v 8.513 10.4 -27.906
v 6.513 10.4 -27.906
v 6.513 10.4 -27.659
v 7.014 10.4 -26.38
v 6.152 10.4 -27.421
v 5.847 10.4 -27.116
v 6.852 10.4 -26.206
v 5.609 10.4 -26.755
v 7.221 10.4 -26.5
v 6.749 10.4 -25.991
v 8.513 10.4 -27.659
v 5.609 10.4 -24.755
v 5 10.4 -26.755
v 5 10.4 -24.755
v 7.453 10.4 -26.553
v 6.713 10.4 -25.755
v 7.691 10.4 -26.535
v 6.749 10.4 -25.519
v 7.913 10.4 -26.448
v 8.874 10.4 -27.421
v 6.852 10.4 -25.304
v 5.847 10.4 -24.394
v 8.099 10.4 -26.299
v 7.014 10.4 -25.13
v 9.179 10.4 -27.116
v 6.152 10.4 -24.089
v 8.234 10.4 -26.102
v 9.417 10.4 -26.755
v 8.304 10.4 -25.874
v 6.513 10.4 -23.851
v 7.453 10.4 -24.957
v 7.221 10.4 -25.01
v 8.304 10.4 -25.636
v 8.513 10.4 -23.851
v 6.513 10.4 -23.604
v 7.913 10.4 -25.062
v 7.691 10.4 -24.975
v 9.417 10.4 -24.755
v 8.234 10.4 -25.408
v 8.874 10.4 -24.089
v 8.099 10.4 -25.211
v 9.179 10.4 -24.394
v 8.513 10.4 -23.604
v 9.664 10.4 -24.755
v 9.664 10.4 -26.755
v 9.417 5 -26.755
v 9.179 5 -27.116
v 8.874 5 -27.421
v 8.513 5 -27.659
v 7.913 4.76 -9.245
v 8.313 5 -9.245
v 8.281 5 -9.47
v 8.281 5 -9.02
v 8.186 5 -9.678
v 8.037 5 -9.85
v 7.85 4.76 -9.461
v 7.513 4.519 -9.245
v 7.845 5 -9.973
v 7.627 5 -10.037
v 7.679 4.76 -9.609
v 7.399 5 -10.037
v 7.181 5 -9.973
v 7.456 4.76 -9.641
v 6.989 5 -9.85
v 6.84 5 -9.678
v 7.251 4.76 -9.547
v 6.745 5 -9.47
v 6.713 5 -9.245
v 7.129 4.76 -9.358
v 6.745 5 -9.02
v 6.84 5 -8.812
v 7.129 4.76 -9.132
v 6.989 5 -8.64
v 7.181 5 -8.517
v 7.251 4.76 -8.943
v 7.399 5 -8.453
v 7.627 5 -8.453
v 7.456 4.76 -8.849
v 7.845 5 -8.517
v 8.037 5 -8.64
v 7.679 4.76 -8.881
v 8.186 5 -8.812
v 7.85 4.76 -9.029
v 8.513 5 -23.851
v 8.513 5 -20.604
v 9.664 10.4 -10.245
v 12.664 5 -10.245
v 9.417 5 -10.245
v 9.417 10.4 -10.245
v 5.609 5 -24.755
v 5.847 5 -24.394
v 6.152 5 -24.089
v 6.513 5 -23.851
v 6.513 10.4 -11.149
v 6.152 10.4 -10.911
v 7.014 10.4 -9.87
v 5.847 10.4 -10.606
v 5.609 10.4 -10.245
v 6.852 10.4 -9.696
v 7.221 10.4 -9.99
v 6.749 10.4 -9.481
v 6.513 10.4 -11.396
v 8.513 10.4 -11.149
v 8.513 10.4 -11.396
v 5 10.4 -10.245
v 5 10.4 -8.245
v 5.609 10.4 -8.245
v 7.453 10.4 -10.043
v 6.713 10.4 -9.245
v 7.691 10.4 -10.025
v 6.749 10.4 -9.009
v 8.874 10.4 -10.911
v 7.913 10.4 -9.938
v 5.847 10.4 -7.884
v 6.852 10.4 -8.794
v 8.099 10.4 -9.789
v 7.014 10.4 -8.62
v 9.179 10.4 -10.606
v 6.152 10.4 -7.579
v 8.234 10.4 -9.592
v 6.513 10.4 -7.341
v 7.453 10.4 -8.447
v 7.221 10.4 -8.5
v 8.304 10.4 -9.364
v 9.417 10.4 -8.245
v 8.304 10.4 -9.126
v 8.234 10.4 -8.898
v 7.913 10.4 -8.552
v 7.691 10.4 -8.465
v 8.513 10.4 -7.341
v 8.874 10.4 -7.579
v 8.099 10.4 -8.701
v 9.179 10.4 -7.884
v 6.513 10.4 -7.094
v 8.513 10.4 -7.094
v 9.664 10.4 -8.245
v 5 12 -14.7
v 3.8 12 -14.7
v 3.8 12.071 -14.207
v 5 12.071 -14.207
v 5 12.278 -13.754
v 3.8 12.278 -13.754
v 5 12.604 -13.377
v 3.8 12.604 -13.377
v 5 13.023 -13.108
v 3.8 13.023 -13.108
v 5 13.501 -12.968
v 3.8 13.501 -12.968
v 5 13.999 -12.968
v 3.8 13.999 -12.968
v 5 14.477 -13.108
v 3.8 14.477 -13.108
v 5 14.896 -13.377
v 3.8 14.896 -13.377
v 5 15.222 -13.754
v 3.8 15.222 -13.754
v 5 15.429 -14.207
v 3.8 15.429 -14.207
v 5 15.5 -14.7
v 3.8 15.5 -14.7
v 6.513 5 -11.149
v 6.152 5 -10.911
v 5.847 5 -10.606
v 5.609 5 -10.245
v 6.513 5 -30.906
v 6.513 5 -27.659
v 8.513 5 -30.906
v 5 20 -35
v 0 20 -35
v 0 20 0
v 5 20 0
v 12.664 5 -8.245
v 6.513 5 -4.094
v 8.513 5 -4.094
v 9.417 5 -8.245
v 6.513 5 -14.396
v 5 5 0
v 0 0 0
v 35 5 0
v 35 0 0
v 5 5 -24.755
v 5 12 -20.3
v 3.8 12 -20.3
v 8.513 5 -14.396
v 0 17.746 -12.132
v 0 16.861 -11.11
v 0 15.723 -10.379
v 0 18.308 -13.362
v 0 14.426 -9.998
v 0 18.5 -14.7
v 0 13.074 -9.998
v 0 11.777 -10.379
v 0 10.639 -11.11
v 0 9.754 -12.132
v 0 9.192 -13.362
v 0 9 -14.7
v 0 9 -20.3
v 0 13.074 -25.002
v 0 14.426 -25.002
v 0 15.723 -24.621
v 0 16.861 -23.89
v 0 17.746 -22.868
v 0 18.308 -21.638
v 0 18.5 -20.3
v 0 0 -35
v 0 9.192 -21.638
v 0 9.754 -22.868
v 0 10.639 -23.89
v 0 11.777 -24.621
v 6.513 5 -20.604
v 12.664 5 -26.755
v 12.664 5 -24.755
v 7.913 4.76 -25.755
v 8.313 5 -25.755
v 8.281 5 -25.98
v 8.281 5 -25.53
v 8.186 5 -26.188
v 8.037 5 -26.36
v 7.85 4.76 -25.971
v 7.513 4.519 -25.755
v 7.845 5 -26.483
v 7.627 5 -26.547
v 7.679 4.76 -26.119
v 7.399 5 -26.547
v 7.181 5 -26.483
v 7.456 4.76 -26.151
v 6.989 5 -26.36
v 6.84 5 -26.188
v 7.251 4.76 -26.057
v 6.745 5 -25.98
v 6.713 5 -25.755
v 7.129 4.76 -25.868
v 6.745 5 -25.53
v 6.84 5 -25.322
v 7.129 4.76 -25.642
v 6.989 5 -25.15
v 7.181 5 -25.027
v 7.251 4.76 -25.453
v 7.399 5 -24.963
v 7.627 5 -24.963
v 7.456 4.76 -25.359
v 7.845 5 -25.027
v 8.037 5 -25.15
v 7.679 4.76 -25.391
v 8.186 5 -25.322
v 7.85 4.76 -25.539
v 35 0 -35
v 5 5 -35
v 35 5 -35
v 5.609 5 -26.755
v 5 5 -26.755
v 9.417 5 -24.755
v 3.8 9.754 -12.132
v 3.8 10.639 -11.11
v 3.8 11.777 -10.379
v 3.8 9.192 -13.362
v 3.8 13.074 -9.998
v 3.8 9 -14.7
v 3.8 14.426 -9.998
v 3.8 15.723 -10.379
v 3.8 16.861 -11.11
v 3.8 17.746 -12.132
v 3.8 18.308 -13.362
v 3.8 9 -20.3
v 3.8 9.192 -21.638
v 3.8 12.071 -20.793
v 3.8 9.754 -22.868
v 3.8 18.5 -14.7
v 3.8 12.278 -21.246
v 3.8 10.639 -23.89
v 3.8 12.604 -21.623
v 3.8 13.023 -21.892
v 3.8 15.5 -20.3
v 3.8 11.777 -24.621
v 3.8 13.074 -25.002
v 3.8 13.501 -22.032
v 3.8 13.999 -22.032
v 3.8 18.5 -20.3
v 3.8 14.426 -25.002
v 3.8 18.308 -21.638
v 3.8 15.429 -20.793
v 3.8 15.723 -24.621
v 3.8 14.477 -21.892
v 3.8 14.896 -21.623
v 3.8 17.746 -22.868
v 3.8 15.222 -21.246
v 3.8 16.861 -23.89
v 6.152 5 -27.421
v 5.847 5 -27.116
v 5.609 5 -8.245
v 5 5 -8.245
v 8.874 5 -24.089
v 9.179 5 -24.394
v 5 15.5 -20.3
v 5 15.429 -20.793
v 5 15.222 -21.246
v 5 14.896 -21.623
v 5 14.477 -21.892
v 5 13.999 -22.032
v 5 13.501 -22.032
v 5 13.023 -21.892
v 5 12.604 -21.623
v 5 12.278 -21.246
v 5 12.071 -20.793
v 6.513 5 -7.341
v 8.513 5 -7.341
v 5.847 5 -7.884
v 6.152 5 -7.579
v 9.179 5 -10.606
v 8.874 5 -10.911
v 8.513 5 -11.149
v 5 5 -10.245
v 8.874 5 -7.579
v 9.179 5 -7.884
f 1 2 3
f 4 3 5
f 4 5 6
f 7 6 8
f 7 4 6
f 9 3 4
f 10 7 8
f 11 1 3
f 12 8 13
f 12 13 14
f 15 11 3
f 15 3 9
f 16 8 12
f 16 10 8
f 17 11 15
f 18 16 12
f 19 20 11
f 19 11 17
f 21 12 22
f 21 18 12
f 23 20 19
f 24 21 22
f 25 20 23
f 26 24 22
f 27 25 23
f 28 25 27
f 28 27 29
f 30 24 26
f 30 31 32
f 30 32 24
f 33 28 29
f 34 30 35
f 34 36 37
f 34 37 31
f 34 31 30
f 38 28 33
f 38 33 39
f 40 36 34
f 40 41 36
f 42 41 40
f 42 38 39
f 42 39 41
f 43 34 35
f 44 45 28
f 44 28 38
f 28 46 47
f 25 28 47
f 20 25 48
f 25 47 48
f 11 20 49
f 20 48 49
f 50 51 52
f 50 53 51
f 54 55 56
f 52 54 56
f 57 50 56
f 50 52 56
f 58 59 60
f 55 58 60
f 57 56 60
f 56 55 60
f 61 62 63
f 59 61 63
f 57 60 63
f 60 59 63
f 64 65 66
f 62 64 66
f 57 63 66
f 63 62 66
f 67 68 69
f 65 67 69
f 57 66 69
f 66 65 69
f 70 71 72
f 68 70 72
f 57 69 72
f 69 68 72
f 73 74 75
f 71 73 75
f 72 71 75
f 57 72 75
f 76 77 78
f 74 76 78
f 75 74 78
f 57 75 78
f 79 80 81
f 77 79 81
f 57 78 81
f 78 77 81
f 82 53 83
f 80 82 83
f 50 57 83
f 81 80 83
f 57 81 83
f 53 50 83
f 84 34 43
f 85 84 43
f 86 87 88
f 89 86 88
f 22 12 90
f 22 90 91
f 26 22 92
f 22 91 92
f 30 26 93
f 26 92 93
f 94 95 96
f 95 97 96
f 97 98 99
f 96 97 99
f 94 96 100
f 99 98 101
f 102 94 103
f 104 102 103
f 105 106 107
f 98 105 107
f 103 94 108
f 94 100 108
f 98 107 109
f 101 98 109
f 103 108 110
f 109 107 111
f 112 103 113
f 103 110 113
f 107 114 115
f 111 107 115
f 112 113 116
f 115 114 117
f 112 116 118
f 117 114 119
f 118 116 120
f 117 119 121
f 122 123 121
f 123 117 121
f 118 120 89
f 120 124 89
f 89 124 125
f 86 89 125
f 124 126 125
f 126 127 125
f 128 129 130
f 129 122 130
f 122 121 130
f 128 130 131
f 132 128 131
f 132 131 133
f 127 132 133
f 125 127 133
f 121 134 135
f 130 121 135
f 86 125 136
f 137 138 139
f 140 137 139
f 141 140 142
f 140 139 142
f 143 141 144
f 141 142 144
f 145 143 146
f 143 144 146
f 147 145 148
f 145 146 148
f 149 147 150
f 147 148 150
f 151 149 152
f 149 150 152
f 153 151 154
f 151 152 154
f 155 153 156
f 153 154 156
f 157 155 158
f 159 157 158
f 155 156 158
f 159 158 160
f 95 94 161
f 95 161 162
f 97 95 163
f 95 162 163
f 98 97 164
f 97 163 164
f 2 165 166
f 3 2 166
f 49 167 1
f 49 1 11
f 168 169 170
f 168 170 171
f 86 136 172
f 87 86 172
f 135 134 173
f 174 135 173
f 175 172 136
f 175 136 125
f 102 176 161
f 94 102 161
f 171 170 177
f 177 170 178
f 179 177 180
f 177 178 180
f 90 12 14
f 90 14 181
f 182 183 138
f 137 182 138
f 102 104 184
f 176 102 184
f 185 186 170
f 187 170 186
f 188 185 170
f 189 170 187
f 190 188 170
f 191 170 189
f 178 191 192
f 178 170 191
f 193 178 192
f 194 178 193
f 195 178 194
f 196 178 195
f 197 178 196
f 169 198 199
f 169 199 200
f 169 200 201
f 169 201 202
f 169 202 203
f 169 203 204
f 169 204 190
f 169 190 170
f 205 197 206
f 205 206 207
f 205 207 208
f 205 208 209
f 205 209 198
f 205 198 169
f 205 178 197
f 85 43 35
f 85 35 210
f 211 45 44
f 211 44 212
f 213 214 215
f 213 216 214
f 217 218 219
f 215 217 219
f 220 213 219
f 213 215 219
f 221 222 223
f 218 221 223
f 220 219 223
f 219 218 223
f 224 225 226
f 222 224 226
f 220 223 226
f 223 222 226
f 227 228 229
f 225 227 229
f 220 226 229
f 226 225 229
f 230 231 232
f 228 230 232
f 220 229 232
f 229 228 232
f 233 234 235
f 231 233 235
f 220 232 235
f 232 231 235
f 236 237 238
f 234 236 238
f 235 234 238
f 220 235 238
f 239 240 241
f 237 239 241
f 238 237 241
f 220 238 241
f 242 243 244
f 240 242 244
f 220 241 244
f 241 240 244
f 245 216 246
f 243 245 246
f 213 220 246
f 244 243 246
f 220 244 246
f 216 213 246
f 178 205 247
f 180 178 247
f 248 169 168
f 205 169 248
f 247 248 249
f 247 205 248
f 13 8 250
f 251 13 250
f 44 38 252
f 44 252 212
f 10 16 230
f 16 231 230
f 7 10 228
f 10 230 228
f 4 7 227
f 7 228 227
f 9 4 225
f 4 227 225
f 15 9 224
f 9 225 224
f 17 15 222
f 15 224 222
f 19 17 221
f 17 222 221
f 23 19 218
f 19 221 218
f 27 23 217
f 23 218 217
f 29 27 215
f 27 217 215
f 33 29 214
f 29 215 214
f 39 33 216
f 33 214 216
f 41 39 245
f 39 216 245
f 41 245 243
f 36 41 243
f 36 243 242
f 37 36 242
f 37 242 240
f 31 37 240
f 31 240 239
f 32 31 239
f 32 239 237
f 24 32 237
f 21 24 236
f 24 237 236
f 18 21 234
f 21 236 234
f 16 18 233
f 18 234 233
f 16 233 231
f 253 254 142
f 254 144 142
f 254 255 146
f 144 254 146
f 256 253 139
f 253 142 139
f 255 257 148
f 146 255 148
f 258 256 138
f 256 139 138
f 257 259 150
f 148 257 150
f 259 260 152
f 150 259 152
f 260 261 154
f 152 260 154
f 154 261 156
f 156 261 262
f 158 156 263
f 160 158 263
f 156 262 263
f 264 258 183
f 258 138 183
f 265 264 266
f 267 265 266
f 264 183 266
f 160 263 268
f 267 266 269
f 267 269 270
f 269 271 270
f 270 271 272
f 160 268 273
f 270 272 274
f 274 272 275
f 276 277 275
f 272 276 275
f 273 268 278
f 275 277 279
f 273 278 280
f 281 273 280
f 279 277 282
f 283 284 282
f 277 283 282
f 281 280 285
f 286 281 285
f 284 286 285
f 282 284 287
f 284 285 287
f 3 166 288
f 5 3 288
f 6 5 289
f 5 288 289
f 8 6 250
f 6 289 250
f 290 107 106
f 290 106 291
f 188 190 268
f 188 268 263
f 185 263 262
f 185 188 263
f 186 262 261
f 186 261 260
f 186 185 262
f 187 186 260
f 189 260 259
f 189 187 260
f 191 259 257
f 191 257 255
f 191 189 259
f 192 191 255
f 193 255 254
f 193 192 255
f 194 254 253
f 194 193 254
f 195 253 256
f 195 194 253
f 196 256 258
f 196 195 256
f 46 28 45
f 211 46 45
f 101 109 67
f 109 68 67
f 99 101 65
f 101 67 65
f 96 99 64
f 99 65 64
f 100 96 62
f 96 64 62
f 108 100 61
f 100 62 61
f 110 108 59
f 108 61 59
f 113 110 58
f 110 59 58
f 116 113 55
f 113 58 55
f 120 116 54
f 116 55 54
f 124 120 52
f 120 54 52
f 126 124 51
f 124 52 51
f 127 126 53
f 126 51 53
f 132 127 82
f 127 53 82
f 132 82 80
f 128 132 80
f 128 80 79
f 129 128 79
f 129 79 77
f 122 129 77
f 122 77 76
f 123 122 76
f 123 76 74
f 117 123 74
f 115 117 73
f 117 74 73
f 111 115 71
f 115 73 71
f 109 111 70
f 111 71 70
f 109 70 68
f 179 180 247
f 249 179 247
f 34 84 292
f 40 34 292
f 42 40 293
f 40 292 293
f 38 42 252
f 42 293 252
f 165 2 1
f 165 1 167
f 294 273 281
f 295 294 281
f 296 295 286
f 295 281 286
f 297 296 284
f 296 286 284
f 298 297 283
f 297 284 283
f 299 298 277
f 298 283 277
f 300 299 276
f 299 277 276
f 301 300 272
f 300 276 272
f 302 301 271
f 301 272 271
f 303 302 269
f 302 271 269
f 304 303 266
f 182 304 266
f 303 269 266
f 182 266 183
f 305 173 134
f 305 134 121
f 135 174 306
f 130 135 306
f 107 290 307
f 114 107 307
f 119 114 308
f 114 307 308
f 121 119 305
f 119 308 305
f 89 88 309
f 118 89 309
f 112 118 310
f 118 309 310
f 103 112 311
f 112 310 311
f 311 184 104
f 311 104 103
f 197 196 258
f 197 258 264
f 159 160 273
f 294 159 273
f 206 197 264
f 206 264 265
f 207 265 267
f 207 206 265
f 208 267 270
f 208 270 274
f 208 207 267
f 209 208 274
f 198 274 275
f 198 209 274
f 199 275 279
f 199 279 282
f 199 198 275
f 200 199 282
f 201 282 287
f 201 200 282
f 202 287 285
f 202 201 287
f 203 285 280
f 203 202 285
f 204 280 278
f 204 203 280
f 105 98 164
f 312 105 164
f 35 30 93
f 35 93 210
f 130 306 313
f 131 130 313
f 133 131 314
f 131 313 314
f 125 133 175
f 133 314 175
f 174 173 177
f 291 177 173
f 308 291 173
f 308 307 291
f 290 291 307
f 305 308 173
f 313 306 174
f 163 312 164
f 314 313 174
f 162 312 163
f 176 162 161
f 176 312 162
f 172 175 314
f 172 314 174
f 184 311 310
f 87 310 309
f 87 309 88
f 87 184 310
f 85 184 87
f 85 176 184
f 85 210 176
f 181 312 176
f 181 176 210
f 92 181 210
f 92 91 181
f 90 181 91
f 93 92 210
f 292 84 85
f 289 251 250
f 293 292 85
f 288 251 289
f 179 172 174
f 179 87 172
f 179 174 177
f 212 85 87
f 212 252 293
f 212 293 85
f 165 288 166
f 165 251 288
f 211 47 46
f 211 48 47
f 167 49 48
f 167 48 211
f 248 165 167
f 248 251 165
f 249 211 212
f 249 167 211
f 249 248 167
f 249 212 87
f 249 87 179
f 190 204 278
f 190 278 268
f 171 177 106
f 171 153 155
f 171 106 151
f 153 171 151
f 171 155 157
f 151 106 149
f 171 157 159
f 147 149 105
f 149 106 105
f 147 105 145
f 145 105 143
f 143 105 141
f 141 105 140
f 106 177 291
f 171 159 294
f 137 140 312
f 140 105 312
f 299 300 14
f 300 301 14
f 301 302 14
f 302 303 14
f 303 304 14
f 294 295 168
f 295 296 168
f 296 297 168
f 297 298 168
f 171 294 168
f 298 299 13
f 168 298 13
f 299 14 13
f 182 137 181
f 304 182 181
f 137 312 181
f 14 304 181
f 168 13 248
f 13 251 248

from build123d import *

# Parameters (mm, degrees)
SKETCH1_W             = 30
SKETCH1_H             = 35
BOSS_EXTRUDE1_DEPTH   = 5
SKETCH1_3_W           = 5
SKETCH1_3_H           = 35
BOSS_EXTRUDE2_DEPTH   = 20
CUT_EXTRUDE1_DEPTH    = 5
CUT_EXTRUDE2_DEPTH    = 3.8
SKETCH3_R             = 2.151
BOSS_EXTRUDE3_DEPTH   = 5.4
RIB1_START            = -1
RIB1_DEPTH            = 2
CIRPATTERN6_COUNT     = 4
SKETCH6_W             = 5.4
SKETCH6_H             = 0.862
BOSS_EXTRUDE4_DEPTH   = 1
MIRROR1_START         = -1
MIRROR1_COPY_1_DEPTH  = 2
MIRROR1_COPY_2_DEPTH  = 2
M2_TAPPED_HOLE1_D     = 1.6
M2_TAPPED_HOLE1_DEPTH = 5.4
M2_TAPPED_HOLE1_TIP   = 0.480688495


with BuildPart() as part:
    # Sketch1 → Boss-Extrude1 (new body)
    with BuildSketch(Plane(origin=(0, 0, 0), x_dir=(1, 0, 0), z_dir=(0, 1, 0))):
        with Locations((20, 17.5)):
            Rectangle(SKETCH1_W, SKETCH1_H)
    extrude(amount=BOSS_EXTRUDE1_DEPTH)

    # Sketch1<3> → Boss-Extrude2 (add)
    with BuildSketch(Plane(origin=(0, 0, 0), x_dir=(1, 0, 0), z_dir=(0, 1, 0))):
        with Locations((2.5, 17.5)):
            Rectangle(SKETCH1_3_W, SKETCH1_3_H)
    extrude(amount=BOSS_EXTRUDE2_DEPTH)

    # Sketch2 → Cut-Extrude1 (cut)
    with BuildSketch(Plane.ZY):
        with BuildLine():
            Line((-20.3, 12), (-14.7, 12))
            ThreePointArc((-14.7, 12), (-12.95, 13.75), (-14.7, 15.5))
            Line((-14.7, 15.5), (-20.3, 15.5))
            ThreePointArc((-20.3, 15.5), (-22.05, 13.75), (-20.3, 12))
        make_face()
    extrude(amount=-CUT_EXTRUDE1_DEPTH, mode=Mode.SUBTRACT)

    # Sketch2<4> → Cut-Extrude2 (cut)
    with BuildSketch(Plane.ZY):
        with BuildLine():
            Line((-20.3, 18.5), (-14.7, 18.5))
            ThreePointArc((-14.7, 18.5), (-9.95, 13.75), (-14.7, 9))
            Line((-14.7, 9), (-20.3, 9))
            ThreePointArc((-20.3, 9), (-25.05, 13.75), (-20.3, 18.5))
        make_face()
        with BuildLine():
            ThreePointArc((-14.7, 12), (-12.95, 13.75), (-14.7, 15.5))
            Line((-14.7, 15.5), (-20.3, 15.5))
            ThreePointArc((-20.3, 15.5), (-22.05, 13.75), (-20.3, 12))
            Line((-20.3, 12), (-14.7, 12))
        make_face(mode=Mode.SUBTRACT)
    extrude(amount=-CUT_EXTRUDE2_DEPTH, mode=Mode.SUBTRACT)

    # Sketch3 → Boss-Extrude3 (add)
    with BuildSketch(Plane(origin=(0, 5, 0), x_dir=(1, 0, 0), z_dir=(0, 1, 0))):
        with Locations(Location((7.513, 25.755, 0), (0, 0, 90))):
            Circle(SKETCH3_R)
        with Locations(Location((7.513, 9.245, 0), (0, 0, 90))):
            Circle(SKETCH3_R)
    extrude(amount=BOSS_EXTRUDE3_DEPTH)

    # Rib1: read off the stored shape, not the designer's step
    # Rib1 outline → Rib1 (add)
    with BuildSketch(Plane(origin=(7.513, 0, 0), x_dir=(0, 0, -1), z_dir=(1, 0, 0)).offset(RIB1_START)):
        Polygon((7.094, 10.4), (4.094, 5), (7.340583816, 5), (7.340583816, 10.4), align=None)
    rib1 = extrude(amount=RIB1_DEPTH)

    # CirPattern6: Rib1 ×4 about axis, 1 skipped
    cirpattern6_axis = Axis((7.513, 0, -9.245), (0, 1, 0))
    add([rib1.rotate(cirpattern6_axis, i * 360 / CIRPATTERN6_COUNT) for i in range(1, CIRPATTERN6_COUNT) if i not in (3,)])

    # Sketch6 → Boss-Extrude4 (add, symmetric)
    with BuildSketch(Plane(origin=(0, 0, -9.245), x_dir=(0, -1, 0), z_dir=(0, 0, 1))):
        with Locations((-7.7, 5.431)):
            Rectangle(SKETCH6_W, SKETCH6_H)
    boss_extrude4 = extrude(amount=BOSS_EXTRUDE4_DEPTH, both=True)

    # Mirror1: Rib1, Boss-Extrude4 across plane
    add(rib1.mirror(Plane.XY.offset(-17.5)))
    add(boss_extrude4.mirror(Plane.XY.offset(-17.5)))

    # Mirror1 copy 1 sketch → Mirror1 copy 1 (add)
    with BuildSketch(Plane(origin=(16.758, 0, -25.755), x_dir=(-1, 0, 0), z_dir=(0, 0, 1)).offset(MIRROR1_START)):
        Polygon((7.094, -10.4), (4.094, -5), (7.340583816, -5), (7.340583816, -10.4), align=None)
    extrude(amount=MIRROR1_COPY_1_DEPTH)

    # Mirror1 copy 2 sketch → Mirror1 copy 2 (add)
    with BuildSketch(Plane(origin=(7.513, 0, -16.51), x_dir=(0, 0, -1), z_dir=(-1, 0, 0)).offset(MIRROR1_START)):
        Polygon((7.094, -10.4), (4.094, -5), (7.340583816, -5), (7.340583816, -10.4), align=None)
    extrude(amount=MIRROR1_COPY_2_DEPTH)

    # M2 Tapped Hole1
    with Locations(Plane(origin=(0, 10.4, 0), x_dir=(1, 0, 0), z_dir=(0, 1, 0))):
        with Locations((7.513, 9.245), (7.513, 25.755)):
            Hole(M2_TAPPED_HOLE1_D / 2, depth=M2_TAPPED_HOLE1_DEPTH)
            with Locations((0, 0, -(M2_TAPPED_HOLE1_DEPTH + M2_TAPPED_HOLE1_TIP / 2))):  # 118° drill point
                Cone(0, M2_TAPPED_HOLE1_D / 2, M2_TAPPED_HOLE1_TIP, mode=Mode.SUBTRACT)


solid = part.part
